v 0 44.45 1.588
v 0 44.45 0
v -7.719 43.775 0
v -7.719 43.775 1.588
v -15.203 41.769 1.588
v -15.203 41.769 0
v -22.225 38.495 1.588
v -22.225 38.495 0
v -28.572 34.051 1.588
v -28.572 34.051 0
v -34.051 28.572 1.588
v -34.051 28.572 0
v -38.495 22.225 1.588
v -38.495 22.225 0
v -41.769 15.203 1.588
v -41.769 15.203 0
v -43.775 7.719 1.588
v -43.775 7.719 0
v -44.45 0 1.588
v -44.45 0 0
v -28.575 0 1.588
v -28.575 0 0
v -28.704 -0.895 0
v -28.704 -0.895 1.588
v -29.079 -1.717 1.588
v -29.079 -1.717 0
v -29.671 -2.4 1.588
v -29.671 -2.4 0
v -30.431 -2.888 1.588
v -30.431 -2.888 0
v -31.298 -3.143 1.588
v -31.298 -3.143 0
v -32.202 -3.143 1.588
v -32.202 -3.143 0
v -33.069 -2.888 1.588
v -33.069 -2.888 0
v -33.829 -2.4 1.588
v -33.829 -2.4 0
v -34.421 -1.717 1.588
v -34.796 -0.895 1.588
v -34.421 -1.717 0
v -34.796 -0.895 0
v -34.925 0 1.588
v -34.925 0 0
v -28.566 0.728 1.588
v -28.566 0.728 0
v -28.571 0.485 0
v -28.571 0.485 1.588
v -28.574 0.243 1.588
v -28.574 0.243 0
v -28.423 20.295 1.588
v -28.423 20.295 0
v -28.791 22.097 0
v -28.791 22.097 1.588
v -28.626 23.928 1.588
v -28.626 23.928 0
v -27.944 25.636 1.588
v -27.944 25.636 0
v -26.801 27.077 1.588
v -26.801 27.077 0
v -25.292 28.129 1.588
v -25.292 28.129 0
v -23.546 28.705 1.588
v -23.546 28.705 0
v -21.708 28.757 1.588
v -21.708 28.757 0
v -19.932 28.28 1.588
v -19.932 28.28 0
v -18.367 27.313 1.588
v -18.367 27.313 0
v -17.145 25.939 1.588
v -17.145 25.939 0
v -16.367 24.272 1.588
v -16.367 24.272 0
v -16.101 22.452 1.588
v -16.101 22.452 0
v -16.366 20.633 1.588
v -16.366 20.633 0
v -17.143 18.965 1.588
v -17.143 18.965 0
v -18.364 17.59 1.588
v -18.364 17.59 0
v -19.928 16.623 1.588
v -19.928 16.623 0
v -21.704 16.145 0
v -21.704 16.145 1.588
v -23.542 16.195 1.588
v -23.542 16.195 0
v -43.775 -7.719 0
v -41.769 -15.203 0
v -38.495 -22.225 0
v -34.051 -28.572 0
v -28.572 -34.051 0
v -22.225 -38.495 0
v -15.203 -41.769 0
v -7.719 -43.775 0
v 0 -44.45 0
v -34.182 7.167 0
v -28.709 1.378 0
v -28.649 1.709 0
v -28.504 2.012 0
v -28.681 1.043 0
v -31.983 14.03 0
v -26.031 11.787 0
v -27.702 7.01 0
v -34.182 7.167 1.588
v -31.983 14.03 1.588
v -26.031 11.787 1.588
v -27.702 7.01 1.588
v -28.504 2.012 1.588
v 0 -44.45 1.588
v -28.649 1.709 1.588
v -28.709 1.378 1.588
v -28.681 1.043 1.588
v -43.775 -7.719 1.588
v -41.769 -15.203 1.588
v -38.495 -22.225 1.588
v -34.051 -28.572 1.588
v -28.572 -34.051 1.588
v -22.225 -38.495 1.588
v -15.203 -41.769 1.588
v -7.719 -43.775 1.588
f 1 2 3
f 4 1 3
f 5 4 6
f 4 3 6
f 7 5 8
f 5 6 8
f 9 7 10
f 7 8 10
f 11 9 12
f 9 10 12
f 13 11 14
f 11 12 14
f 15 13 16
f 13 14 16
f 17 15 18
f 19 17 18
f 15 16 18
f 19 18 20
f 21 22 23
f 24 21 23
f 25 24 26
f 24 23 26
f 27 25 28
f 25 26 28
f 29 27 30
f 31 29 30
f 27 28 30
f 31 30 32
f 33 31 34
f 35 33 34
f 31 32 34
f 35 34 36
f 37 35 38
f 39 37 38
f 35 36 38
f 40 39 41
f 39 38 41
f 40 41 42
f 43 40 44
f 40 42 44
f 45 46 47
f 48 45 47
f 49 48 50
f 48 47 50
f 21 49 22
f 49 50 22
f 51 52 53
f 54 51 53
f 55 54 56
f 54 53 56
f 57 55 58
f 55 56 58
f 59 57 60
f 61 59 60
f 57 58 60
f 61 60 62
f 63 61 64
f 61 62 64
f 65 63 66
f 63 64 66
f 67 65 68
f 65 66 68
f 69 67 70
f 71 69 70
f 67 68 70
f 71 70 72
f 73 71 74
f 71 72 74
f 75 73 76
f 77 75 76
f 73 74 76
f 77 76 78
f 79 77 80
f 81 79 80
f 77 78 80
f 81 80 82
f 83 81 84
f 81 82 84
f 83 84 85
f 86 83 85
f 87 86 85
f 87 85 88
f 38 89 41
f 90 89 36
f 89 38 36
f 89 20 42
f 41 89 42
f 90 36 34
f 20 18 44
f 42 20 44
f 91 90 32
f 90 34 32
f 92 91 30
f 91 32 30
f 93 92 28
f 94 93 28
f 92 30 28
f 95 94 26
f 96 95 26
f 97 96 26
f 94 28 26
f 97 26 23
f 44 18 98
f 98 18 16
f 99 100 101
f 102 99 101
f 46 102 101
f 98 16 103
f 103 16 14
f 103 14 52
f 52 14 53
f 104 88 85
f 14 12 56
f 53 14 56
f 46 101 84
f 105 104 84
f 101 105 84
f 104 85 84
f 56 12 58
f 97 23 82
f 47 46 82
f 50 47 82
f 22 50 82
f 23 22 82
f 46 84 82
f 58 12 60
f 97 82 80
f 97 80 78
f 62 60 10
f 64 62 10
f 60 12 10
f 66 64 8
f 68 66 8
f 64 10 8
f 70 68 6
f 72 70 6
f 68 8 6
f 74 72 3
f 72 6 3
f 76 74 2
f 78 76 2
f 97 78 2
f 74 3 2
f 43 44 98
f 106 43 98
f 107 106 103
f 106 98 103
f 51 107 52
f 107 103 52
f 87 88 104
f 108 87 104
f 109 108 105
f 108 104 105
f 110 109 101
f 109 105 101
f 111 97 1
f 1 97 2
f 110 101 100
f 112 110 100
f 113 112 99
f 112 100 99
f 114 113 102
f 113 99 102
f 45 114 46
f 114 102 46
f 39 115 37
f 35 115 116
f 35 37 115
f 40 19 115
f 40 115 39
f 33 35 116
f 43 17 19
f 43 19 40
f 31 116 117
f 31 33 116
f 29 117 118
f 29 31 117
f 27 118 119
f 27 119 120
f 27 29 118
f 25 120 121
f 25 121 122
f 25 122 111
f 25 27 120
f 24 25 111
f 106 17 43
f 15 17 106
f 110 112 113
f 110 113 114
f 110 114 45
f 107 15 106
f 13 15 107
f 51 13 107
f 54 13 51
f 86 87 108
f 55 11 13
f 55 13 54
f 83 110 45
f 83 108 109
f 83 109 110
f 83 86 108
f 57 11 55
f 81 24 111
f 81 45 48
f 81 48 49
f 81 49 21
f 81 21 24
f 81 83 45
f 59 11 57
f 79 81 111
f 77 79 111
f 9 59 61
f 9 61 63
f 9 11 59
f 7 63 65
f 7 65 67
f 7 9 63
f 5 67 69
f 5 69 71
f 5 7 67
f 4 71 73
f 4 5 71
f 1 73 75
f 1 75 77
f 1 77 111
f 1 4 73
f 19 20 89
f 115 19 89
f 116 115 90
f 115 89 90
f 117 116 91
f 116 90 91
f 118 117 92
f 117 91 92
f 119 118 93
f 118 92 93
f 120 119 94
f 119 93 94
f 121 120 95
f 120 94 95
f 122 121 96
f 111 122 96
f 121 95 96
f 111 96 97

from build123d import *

# Parameters (mm, degrees)
F1_DEPTH = 1.5875


with BuildPart() as f1:
    # F0 (on Top) → F1 (new body)
    with BuildSketch(Plane.XY):
        with BuildLine():
            Line((0, -44.45), (0, 44.45))
            ThreePointArc((0, 44.45), (-31.430896, 31.430896), (-44.45, 0))
            ThreePointArc((-44.45, 0), (-31.430896, -31.430896), (0, -44.45))
        make_face()
        with BuildLine():
            ThreePointArc((-28.575, 0), (-31.75, -3.175), (-34.925, 0))
            ThreePointArc((-34.925, 0), (-33.259902, 10.65526), (-28.423379, 20.294511))
            ThreePointArc((-28.423379, 20.294511), (-18.366773, 27.313204), (-23.54243, 16.195203))
            ThreePointArc((-23.54243, 16.195203), (-26.972249, 9.435487), (-28.504091, 2.011817))
            ThreePointArc((-28.504091, 2.011817), (-28.709383, 1.378157), (-28.565731, 0.727747))
            ThreePointArc((-28.565731, 0.727747), (-28.572683, 0.363903), (-28.575, 0))
        make_face(mode=Mode.SUBTRACT)
    extrude(amount=F1_DEPTH)


solid = f1.part
